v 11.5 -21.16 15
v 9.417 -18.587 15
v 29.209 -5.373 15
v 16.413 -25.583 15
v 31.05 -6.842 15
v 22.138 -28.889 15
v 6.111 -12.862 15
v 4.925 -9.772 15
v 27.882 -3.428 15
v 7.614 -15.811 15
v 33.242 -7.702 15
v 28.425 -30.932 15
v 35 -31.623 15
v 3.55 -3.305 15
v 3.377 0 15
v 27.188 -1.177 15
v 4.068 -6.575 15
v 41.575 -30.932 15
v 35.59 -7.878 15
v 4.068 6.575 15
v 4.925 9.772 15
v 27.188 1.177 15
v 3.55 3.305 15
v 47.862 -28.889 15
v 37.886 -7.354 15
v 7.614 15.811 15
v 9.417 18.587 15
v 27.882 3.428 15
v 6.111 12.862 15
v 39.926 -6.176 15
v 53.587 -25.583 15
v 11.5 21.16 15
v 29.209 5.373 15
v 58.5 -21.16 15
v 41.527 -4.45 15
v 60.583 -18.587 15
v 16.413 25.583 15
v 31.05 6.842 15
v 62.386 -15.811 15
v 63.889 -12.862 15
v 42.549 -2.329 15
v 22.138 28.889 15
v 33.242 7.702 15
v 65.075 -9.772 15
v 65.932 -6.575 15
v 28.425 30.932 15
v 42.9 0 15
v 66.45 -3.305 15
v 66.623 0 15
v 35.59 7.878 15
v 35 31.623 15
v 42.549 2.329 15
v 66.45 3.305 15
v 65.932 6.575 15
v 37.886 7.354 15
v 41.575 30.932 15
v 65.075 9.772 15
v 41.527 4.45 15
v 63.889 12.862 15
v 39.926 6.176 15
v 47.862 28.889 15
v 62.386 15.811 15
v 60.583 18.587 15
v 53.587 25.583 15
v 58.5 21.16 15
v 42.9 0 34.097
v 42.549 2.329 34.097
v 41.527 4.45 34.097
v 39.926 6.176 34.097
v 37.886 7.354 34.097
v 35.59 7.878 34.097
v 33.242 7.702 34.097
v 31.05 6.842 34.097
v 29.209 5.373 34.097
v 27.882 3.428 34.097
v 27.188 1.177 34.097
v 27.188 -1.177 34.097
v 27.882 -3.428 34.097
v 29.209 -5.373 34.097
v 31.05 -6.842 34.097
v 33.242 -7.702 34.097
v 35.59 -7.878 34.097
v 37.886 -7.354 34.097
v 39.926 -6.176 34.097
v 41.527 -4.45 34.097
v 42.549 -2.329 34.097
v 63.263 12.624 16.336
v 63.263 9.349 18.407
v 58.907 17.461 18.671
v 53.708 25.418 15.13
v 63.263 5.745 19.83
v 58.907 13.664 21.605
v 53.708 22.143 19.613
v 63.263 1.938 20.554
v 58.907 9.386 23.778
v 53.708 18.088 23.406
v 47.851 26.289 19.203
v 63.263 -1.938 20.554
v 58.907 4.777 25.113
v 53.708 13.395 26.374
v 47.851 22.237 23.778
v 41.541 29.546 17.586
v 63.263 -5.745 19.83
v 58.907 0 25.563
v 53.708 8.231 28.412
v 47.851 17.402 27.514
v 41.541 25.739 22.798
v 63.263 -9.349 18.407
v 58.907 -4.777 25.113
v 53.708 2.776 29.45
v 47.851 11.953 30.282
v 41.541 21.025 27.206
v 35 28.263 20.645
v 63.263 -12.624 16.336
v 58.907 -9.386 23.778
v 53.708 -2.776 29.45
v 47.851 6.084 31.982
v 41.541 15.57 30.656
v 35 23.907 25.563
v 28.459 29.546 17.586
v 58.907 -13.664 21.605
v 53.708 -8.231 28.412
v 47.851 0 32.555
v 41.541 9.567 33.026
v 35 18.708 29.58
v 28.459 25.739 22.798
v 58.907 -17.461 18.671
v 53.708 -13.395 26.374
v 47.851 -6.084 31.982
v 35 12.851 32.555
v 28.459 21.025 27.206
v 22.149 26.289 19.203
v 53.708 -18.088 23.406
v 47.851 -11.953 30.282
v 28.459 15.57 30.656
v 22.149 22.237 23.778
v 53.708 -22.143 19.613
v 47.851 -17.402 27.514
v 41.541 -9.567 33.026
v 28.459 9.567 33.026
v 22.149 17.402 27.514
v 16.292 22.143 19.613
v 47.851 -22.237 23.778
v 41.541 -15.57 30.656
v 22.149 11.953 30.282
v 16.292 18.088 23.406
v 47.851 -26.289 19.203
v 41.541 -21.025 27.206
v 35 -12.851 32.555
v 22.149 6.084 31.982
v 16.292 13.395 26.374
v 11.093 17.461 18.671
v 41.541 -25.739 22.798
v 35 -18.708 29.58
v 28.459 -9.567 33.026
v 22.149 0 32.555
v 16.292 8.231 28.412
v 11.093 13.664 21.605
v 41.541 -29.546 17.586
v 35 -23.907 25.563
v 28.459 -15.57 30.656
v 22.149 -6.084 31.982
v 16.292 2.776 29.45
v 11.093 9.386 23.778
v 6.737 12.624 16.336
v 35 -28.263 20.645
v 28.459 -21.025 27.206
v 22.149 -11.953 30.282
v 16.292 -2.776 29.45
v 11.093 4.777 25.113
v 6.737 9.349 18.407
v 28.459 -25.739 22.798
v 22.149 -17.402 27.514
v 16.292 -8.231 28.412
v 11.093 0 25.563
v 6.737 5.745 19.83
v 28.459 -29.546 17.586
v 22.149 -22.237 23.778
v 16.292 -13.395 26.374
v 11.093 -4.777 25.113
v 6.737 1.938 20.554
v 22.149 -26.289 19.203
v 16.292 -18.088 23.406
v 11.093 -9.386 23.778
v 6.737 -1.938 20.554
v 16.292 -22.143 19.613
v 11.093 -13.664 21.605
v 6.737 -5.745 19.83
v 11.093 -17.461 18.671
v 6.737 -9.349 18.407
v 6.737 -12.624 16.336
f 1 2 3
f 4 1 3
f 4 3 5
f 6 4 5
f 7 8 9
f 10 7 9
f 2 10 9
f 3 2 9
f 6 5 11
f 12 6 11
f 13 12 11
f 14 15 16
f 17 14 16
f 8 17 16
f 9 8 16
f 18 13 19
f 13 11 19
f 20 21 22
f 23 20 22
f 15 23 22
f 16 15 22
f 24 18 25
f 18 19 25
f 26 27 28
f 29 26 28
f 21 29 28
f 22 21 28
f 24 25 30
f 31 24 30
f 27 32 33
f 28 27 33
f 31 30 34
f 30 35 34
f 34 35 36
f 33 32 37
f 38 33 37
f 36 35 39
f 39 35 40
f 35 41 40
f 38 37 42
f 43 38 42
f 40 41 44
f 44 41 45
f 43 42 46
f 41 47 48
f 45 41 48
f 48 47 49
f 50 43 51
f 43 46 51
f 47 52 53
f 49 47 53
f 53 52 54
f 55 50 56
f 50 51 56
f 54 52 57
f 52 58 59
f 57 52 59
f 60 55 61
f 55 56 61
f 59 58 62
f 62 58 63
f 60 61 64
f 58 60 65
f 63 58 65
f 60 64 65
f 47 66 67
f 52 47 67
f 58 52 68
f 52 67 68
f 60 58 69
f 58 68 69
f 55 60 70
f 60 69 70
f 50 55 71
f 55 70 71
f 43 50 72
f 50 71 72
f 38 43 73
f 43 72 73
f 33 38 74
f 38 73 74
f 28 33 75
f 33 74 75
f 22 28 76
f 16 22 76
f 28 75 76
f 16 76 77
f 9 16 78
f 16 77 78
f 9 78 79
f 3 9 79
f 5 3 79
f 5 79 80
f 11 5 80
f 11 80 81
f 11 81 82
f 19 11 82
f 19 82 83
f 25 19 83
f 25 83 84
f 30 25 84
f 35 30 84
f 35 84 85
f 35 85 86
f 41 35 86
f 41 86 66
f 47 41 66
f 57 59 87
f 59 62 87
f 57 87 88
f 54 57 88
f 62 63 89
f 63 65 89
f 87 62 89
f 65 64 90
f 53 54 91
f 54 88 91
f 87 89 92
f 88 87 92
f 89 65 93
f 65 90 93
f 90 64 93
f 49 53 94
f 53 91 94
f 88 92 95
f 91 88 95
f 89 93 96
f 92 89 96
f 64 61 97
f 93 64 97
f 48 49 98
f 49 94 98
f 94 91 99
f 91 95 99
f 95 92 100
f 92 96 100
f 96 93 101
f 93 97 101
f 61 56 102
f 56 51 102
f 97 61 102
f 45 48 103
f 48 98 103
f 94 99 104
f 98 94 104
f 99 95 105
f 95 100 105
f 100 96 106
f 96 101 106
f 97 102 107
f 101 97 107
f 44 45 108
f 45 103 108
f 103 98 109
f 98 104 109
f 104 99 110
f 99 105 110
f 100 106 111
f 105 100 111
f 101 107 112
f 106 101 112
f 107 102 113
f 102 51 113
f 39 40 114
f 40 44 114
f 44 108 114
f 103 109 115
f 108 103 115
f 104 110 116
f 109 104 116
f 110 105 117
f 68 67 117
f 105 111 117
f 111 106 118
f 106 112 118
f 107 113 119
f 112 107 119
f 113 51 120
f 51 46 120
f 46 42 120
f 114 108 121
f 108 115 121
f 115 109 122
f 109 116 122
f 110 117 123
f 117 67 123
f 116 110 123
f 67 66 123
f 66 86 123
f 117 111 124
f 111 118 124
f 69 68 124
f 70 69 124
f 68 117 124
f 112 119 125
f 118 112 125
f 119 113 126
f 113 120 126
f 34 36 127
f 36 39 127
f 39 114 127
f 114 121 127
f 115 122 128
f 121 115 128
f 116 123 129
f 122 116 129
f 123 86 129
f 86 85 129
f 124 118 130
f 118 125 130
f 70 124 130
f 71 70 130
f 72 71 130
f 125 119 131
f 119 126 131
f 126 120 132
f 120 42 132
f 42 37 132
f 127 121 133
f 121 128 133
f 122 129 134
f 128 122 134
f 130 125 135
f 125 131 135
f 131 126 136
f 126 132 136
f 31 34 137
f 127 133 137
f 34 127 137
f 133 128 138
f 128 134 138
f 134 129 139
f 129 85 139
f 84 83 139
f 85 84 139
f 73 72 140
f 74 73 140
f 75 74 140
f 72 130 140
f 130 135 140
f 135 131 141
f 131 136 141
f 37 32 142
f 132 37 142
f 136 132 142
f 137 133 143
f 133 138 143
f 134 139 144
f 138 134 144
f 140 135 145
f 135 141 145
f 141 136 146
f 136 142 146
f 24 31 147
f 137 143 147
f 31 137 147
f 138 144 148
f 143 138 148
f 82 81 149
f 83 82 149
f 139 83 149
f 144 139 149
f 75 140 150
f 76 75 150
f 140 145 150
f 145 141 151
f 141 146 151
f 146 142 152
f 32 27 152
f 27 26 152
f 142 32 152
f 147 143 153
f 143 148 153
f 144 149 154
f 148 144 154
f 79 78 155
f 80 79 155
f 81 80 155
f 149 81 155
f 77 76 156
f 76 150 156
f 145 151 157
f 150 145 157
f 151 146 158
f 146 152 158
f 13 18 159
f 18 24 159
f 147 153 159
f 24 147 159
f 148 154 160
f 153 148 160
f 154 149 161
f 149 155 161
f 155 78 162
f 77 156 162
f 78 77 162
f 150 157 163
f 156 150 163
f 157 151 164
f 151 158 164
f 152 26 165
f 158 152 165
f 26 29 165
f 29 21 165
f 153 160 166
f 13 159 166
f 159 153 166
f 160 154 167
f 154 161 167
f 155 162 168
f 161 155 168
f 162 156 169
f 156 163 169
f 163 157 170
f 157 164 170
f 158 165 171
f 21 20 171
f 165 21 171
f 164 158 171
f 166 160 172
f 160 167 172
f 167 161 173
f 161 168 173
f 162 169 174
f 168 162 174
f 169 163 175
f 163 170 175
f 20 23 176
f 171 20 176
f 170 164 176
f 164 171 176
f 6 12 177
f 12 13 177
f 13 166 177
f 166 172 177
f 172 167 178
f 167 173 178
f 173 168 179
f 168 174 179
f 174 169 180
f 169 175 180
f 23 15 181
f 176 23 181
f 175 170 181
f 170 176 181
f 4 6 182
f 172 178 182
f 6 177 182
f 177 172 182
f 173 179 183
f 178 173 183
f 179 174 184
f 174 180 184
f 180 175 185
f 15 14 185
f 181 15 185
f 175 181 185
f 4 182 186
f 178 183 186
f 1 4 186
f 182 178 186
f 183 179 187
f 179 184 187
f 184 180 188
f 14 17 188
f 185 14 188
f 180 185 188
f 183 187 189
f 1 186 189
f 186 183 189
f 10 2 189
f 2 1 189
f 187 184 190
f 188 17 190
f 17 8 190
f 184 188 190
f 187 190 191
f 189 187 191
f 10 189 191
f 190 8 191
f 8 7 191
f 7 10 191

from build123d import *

# Parameters (mm, degrees)
SKETCH6_R           = 22.5
SKETCH6_R_2         = 1
CUT_EXTRUDE8_DEPTH  = 20
SKETCH7_R           = 7.9
CUT_EXTRUDE9_DEPTH  = 20
SKETCH9_W           = 74.911016849
SKETCH9_H           = 74.606087337
CUT_EXTRUDE11_DEPTH = 50


with BuildPart() as part:
    # Sketch2 → Revolve1 (revolve)
    with BuildSketch(Plane.XY):
        with BuildLine():
            Line((0, 0), (70, 0))
            ThreePointArc((70, 0), (35, 35), (0, 0))
        make_face()
    revolve(axis=Axis((0, 0, 0), (1, 0, 0)))

    # Sketch6 → Cut-Extrude8 (cut)
    with BuildSketch(Plane.XY.offset(-5)):
        with Locations((35, -7)):
            Circle(SKETCH6_R)
        with Locations((17.5, -7)):
            Circle(SKETCH6_R_2, mode=Mode.SUBTRACT)
        with Locations((52.5, -7)):
            Circle(SKETCH6_R_2, mode=Mode.SUBTRACT)
    extrude(amount=CUT_EXTRUDE8_DEPTH, mode=Mode.SUBTRACT)

    # Sketch7 → Cut-Extrude9 (cut)
    with BuildSketch(Plane.XY.offset(35)):
        with Locations((35, 0)):
            Circle(SKETCH7_R)
    extrude(amount=-CUT_EXTRUDE9_DEPTH, mode=Mode.SUBTRACT)

    # Sketch9 → Cut-Extrude11 (cut)
    with BuildSketch(Plane.XY.offset(-35)):
        with Locations((35.457394269, -0.10164317)):
            Rectangle(SKETCH9_W, SKETCH9_H)
    extrude(amount=CUT_EXTRUDE11_DEPTH, mode=Mode.SUBTRACT)


solid = part.part
